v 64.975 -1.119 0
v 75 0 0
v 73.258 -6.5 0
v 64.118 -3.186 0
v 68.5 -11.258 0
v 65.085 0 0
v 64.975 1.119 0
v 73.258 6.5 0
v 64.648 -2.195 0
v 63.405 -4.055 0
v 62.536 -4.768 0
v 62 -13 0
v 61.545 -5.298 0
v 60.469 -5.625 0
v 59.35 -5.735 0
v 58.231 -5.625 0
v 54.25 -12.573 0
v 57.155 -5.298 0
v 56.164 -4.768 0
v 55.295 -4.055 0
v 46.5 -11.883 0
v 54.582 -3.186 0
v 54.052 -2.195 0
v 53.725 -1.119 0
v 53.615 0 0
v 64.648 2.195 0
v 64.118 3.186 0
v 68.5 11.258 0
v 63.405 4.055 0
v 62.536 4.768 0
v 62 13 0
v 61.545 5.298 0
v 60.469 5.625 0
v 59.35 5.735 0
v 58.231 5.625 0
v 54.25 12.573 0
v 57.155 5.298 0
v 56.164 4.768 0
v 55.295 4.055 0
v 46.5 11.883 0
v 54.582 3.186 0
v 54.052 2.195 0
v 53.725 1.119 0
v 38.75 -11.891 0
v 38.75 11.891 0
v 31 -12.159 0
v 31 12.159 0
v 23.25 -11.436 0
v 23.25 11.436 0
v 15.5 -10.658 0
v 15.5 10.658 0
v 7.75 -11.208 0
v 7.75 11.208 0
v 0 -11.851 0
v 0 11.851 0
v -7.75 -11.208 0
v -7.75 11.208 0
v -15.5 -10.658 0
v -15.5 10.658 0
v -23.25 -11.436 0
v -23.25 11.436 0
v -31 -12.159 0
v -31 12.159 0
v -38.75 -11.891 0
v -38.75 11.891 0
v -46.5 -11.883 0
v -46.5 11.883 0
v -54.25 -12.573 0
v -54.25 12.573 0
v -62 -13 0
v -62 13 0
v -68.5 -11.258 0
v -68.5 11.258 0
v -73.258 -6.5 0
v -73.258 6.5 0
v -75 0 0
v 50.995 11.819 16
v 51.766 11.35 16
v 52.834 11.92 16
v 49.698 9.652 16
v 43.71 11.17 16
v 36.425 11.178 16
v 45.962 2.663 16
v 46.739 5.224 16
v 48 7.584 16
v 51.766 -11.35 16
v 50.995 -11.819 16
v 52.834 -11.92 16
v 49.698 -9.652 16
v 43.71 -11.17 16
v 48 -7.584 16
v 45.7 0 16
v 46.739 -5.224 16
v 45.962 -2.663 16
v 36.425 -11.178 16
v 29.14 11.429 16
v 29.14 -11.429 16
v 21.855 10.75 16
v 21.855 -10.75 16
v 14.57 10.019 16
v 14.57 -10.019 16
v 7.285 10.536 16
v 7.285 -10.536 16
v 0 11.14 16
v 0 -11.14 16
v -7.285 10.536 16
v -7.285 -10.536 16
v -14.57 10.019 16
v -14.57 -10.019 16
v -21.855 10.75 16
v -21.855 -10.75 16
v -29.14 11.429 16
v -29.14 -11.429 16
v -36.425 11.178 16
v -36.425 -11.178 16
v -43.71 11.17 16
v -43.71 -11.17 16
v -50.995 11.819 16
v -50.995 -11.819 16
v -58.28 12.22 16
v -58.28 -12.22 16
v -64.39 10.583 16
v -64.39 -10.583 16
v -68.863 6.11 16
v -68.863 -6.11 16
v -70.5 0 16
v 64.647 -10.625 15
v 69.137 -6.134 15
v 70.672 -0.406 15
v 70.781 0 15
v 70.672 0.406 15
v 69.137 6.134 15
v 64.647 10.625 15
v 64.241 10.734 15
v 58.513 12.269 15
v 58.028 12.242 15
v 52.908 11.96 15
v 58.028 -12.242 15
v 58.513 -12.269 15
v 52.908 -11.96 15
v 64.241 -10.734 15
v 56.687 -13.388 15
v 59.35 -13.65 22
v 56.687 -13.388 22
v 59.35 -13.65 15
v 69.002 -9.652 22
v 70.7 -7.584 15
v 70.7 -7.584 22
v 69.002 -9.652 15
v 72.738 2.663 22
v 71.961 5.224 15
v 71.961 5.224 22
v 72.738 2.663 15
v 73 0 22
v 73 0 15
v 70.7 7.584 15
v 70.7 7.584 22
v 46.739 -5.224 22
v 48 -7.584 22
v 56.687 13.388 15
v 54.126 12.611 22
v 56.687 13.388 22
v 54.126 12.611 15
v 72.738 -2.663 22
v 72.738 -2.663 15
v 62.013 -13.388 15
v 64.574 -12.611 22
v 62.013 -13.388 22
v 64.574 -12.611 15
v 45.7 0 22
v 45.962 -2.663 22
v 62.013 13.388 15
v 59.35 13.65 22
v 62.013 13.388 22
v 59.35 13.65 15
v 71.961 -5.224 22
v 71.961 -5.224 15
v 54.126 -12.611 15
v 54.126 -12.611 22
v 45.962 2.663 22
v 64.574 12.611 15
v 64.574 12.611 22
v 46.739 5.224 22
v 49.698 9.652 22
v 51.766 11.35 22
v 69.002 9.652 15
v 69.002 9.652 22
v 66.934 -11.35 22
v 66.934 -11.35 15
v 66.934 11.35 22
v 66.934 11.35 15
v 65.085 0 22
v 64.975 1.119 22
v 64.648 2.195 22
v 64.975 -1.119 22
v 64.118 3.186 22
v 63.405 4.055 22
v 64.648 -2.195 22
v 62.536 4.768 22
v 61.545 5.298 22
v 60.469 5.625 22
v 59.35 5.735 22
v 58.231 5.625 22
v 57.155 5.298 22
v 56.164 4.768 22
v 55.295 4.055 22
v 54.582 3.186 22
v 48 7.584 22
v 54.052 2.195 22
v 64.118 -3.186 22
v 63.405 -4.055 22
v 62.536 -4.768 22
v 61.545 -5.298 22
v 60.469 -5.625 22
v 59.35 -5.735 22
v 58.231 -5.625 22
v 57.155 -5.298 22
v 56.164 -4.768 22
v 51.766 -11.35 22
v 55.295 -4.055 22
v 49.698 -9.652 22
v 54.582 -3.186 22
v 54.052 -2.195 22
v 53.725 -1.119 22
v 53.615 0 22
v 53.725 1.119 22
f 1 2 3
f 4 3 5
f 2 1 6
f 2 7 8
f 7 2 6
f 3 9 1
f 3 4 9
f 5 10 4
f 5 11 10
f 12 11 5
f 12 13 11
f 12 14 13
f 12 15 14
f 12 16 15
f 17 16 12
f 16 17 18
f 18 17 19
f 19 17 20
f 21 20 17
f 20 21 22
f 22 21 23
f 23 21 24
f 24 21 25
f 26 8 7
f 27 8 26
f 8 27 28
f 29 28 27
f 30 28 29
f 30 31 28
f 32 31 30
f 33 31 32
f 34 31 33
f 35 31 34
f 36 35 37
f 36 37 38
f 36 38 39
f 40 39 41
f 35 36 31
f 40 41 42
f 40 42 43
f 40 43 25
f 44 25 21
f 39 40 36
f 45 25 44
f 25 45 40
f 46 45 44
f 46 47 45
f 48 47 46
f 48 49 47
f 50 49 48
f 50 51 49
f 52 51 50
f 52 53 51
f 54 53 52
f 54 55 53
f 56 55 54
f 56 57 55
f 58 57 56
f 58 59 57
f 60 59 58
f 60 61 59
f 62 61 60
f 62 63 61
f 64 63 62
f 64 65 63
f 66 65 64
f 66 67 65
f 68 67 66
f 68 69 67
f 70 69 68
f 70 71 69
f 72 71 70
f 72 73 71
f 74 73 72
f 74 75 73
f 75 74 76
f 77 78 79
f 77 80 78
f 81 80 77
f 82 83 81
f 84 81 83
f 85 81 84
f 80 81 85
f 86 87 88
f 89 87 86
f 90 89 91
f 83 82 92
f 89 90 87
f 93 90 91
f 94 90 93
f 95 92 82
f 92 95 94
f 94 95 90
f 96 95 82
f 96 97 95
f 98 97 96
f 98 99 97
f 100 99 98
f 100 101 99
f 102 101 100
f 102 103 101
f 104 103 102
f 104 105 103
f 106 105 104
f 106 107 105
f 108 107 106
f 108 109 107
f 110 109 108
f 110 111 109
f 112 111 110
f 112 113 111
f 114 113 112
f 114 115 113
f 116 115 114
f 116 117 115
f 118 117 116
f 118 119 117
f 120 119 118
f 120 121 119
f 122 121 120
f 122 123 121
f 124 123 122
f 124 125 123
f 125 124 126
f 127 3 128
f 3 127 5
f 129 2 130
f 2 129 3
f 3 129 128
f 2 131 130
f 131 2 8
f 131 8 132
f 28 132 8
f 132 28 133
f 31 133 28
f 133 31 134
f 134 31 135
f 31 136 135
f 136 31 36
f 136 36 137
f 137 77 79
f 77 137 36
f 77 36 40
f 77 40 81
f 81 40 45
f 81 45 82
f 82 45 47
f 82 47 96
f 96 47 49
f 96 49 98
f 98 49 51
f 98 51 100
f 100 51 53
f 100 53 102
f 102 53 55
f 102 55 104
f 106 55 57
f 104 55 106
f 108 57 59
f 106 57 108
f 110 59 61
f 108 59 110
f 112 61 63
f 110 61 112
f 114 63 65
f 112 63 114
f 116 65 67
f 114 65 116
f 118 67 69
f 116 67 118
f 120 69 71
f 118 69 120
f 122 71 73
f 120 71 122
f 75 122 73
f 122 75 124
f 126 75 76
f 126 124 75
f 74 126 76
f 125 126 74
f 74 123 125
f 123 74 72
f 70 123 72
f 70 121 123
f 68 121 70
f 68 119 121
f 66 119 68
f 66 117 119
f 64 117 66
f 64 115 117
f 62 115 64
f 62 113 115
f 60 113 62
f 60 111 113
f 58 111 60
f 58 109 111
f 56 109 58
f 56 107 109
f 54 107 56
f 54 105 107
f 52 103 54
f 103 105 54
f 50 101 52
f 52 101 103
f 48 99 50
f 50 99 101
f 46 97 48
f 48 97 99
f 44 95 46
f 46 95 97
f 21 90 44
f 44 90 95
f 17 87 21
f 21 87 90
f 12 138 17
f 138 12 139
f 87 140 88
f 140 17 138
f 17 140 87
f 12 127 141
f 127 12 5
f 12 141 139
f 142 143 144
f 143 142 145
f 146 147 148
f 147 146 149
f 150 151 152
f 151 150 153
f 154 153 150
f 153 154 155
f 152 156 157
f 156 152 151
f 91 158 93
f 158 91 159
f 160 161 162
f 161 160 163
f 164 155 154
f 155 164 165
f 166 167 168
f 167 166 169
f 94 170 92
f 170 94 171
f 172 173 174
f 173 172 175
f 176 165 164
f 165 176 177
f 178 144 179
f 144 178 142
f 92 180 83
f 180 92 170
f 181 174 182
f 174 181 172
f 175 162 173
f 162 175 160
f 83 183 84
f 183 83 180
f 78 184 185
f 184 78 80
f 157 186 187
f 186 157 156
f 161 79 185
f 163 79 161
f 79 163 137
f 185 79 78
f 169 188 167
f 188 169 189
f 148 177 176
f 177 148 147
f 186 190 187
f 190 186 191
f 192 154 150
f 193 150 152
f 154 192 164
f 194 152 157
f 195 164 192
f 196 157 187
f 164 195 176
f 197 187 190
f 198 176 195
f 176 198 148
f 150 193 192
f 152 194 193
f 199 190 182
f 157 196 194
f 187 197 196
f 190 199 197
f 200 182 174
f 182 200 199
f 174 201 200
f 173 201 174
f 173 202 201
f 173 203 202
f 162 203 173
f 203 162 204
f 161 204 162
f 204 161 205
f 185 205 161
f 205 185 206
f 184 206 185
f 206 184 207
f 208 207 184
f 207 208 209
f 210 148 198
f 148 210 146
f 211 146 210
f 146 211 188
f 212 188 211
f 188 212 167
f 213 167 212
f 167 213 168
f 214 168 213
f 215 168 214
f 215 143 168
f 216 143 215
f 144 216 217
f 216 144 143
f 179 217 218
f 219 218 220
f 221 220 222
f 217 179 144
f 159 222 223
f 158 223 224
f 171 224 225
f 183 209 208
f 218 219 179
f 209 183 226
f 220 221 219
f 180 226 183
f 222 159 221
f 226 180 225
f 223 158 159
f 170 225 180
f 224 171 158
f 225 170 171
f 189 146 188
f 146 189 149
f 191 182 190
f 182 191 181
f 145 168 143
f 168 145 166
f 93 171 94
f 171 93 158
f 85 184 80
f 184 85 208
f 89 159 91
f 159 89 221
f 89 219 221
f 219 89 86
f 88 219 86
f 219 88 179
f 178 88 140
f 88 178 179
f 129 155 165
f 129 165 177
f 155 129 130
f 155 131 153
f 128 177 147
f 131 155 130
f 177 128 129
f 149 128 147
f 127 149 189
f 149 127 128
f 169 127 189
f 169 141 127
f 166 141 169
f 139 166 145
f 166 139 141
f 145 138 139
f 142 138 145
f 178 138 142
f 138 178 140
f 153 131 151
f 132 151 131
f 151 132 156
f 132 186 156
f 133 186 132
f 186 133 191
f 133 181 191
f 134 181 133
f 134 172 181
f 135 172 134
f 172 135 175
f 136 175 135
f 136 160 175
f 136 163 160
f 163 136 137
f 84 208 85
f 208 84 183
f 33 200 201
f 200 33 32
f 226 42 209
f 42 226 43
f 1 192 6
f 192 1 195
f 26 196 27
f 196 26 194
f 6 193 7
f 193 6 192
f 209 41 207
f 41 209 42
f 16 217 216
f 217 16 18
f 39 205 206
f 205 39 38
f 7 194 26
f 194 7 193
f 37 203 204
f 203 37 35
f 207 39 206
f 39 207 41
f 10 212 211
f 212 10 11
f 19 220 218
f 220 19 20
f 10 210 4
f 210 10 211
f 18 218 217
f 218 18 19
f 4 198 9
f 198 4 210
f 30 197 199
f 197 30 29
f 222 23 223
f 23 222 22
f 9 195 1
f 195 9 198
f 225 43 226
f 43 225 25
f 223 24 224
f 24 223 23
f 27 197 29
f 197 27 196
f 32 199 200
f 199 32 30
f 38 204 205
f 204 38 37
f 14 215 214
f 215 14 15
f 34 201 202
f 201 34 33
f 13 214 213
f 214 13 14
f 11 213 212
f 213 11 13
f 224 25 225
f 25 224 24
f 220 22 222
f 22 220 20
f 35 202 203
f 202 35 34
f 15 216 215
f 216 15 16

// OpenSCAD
$fn = 32;

// ----------------------------------------------------------------------
// Handle: 150 x 26 mm grip, 16 mm thick
// ----------------------------------------------------------------------

// --- parameters (mm) ---
length = 150;             // grip length
width = 26;               // grip width
thickness = 16;           // grip thickness
waist = 0.86;             // width factor at the middle
draft = 0.94;             // top face scale of the extrusion
scallops = 4;             // finger rests per side
ripple = 0.06;            // depth factor of the finger rests
boss_d = 27.3;            // mounting boss diameter
boss_h = 6;               // mounting boss height
boss_hole_d = 11.47;      // screw clearance through the boss
boss_r = 59.35;           // boss centre from the grip centre

/* ergonomic grip outline, closed spline-like polygon in the XY plane */
grip = [[-62, 13], [-54.25, 12.573], [-46.5, 11.883], [-38.75, 11.891], [-31, 12.159], [-23.25, 11.436], [-15.5, 10.658], [-7.75, 11.208], [0, 11.851], [7.75, 11.208], [15.5, 10.658], [23.25, 11.436], [31, 12.159], [38.75, 11.891], [46.5, 11.883], [54.25, 12.573], [62, 13], [68.5, 11.258], [73.258, 6.5], [75, 0], [73.258, -6.5], [68.5, -11.258], [62, -13], [62, -13], [54.25, -12.573], [46.5, -11.883], [38.75, -11.891], [31, -12.159], [23.25, -11.436], [15.5, -10.658], [7.75, -11.208], [0, -11.851], [-7.75, -11.208], [-15.5, -10.658], [-23.25, -11.436], [-31, -12.159], [-38.75, -11.891], [-46.5, -11.883], [-54.25, -12.573], [-62, -13], [-68.5, -11.258], [-73.258, -6.5], [-75, 0], [-73.258, 6.5], [-68.5, 11.258], [-62, 13]];

module grip_body() {
  linear_extrude(height = thickness, scale = draft) polygon(grip);
}

module boss_body() {
  /* sunk 1 mm into the grip so the joint overlaps */
  translate([boss_r, 0, thickness - 1]) cylinder(h = boss_h + 1, d = boss_d);
}

difference() {
  union() {
    grip_body();
    boss_body();
  }
  translate([boss_r, 0, -1]) cylinder(h = thickness + boss_h + 2, d = boss_hole_d);
}
